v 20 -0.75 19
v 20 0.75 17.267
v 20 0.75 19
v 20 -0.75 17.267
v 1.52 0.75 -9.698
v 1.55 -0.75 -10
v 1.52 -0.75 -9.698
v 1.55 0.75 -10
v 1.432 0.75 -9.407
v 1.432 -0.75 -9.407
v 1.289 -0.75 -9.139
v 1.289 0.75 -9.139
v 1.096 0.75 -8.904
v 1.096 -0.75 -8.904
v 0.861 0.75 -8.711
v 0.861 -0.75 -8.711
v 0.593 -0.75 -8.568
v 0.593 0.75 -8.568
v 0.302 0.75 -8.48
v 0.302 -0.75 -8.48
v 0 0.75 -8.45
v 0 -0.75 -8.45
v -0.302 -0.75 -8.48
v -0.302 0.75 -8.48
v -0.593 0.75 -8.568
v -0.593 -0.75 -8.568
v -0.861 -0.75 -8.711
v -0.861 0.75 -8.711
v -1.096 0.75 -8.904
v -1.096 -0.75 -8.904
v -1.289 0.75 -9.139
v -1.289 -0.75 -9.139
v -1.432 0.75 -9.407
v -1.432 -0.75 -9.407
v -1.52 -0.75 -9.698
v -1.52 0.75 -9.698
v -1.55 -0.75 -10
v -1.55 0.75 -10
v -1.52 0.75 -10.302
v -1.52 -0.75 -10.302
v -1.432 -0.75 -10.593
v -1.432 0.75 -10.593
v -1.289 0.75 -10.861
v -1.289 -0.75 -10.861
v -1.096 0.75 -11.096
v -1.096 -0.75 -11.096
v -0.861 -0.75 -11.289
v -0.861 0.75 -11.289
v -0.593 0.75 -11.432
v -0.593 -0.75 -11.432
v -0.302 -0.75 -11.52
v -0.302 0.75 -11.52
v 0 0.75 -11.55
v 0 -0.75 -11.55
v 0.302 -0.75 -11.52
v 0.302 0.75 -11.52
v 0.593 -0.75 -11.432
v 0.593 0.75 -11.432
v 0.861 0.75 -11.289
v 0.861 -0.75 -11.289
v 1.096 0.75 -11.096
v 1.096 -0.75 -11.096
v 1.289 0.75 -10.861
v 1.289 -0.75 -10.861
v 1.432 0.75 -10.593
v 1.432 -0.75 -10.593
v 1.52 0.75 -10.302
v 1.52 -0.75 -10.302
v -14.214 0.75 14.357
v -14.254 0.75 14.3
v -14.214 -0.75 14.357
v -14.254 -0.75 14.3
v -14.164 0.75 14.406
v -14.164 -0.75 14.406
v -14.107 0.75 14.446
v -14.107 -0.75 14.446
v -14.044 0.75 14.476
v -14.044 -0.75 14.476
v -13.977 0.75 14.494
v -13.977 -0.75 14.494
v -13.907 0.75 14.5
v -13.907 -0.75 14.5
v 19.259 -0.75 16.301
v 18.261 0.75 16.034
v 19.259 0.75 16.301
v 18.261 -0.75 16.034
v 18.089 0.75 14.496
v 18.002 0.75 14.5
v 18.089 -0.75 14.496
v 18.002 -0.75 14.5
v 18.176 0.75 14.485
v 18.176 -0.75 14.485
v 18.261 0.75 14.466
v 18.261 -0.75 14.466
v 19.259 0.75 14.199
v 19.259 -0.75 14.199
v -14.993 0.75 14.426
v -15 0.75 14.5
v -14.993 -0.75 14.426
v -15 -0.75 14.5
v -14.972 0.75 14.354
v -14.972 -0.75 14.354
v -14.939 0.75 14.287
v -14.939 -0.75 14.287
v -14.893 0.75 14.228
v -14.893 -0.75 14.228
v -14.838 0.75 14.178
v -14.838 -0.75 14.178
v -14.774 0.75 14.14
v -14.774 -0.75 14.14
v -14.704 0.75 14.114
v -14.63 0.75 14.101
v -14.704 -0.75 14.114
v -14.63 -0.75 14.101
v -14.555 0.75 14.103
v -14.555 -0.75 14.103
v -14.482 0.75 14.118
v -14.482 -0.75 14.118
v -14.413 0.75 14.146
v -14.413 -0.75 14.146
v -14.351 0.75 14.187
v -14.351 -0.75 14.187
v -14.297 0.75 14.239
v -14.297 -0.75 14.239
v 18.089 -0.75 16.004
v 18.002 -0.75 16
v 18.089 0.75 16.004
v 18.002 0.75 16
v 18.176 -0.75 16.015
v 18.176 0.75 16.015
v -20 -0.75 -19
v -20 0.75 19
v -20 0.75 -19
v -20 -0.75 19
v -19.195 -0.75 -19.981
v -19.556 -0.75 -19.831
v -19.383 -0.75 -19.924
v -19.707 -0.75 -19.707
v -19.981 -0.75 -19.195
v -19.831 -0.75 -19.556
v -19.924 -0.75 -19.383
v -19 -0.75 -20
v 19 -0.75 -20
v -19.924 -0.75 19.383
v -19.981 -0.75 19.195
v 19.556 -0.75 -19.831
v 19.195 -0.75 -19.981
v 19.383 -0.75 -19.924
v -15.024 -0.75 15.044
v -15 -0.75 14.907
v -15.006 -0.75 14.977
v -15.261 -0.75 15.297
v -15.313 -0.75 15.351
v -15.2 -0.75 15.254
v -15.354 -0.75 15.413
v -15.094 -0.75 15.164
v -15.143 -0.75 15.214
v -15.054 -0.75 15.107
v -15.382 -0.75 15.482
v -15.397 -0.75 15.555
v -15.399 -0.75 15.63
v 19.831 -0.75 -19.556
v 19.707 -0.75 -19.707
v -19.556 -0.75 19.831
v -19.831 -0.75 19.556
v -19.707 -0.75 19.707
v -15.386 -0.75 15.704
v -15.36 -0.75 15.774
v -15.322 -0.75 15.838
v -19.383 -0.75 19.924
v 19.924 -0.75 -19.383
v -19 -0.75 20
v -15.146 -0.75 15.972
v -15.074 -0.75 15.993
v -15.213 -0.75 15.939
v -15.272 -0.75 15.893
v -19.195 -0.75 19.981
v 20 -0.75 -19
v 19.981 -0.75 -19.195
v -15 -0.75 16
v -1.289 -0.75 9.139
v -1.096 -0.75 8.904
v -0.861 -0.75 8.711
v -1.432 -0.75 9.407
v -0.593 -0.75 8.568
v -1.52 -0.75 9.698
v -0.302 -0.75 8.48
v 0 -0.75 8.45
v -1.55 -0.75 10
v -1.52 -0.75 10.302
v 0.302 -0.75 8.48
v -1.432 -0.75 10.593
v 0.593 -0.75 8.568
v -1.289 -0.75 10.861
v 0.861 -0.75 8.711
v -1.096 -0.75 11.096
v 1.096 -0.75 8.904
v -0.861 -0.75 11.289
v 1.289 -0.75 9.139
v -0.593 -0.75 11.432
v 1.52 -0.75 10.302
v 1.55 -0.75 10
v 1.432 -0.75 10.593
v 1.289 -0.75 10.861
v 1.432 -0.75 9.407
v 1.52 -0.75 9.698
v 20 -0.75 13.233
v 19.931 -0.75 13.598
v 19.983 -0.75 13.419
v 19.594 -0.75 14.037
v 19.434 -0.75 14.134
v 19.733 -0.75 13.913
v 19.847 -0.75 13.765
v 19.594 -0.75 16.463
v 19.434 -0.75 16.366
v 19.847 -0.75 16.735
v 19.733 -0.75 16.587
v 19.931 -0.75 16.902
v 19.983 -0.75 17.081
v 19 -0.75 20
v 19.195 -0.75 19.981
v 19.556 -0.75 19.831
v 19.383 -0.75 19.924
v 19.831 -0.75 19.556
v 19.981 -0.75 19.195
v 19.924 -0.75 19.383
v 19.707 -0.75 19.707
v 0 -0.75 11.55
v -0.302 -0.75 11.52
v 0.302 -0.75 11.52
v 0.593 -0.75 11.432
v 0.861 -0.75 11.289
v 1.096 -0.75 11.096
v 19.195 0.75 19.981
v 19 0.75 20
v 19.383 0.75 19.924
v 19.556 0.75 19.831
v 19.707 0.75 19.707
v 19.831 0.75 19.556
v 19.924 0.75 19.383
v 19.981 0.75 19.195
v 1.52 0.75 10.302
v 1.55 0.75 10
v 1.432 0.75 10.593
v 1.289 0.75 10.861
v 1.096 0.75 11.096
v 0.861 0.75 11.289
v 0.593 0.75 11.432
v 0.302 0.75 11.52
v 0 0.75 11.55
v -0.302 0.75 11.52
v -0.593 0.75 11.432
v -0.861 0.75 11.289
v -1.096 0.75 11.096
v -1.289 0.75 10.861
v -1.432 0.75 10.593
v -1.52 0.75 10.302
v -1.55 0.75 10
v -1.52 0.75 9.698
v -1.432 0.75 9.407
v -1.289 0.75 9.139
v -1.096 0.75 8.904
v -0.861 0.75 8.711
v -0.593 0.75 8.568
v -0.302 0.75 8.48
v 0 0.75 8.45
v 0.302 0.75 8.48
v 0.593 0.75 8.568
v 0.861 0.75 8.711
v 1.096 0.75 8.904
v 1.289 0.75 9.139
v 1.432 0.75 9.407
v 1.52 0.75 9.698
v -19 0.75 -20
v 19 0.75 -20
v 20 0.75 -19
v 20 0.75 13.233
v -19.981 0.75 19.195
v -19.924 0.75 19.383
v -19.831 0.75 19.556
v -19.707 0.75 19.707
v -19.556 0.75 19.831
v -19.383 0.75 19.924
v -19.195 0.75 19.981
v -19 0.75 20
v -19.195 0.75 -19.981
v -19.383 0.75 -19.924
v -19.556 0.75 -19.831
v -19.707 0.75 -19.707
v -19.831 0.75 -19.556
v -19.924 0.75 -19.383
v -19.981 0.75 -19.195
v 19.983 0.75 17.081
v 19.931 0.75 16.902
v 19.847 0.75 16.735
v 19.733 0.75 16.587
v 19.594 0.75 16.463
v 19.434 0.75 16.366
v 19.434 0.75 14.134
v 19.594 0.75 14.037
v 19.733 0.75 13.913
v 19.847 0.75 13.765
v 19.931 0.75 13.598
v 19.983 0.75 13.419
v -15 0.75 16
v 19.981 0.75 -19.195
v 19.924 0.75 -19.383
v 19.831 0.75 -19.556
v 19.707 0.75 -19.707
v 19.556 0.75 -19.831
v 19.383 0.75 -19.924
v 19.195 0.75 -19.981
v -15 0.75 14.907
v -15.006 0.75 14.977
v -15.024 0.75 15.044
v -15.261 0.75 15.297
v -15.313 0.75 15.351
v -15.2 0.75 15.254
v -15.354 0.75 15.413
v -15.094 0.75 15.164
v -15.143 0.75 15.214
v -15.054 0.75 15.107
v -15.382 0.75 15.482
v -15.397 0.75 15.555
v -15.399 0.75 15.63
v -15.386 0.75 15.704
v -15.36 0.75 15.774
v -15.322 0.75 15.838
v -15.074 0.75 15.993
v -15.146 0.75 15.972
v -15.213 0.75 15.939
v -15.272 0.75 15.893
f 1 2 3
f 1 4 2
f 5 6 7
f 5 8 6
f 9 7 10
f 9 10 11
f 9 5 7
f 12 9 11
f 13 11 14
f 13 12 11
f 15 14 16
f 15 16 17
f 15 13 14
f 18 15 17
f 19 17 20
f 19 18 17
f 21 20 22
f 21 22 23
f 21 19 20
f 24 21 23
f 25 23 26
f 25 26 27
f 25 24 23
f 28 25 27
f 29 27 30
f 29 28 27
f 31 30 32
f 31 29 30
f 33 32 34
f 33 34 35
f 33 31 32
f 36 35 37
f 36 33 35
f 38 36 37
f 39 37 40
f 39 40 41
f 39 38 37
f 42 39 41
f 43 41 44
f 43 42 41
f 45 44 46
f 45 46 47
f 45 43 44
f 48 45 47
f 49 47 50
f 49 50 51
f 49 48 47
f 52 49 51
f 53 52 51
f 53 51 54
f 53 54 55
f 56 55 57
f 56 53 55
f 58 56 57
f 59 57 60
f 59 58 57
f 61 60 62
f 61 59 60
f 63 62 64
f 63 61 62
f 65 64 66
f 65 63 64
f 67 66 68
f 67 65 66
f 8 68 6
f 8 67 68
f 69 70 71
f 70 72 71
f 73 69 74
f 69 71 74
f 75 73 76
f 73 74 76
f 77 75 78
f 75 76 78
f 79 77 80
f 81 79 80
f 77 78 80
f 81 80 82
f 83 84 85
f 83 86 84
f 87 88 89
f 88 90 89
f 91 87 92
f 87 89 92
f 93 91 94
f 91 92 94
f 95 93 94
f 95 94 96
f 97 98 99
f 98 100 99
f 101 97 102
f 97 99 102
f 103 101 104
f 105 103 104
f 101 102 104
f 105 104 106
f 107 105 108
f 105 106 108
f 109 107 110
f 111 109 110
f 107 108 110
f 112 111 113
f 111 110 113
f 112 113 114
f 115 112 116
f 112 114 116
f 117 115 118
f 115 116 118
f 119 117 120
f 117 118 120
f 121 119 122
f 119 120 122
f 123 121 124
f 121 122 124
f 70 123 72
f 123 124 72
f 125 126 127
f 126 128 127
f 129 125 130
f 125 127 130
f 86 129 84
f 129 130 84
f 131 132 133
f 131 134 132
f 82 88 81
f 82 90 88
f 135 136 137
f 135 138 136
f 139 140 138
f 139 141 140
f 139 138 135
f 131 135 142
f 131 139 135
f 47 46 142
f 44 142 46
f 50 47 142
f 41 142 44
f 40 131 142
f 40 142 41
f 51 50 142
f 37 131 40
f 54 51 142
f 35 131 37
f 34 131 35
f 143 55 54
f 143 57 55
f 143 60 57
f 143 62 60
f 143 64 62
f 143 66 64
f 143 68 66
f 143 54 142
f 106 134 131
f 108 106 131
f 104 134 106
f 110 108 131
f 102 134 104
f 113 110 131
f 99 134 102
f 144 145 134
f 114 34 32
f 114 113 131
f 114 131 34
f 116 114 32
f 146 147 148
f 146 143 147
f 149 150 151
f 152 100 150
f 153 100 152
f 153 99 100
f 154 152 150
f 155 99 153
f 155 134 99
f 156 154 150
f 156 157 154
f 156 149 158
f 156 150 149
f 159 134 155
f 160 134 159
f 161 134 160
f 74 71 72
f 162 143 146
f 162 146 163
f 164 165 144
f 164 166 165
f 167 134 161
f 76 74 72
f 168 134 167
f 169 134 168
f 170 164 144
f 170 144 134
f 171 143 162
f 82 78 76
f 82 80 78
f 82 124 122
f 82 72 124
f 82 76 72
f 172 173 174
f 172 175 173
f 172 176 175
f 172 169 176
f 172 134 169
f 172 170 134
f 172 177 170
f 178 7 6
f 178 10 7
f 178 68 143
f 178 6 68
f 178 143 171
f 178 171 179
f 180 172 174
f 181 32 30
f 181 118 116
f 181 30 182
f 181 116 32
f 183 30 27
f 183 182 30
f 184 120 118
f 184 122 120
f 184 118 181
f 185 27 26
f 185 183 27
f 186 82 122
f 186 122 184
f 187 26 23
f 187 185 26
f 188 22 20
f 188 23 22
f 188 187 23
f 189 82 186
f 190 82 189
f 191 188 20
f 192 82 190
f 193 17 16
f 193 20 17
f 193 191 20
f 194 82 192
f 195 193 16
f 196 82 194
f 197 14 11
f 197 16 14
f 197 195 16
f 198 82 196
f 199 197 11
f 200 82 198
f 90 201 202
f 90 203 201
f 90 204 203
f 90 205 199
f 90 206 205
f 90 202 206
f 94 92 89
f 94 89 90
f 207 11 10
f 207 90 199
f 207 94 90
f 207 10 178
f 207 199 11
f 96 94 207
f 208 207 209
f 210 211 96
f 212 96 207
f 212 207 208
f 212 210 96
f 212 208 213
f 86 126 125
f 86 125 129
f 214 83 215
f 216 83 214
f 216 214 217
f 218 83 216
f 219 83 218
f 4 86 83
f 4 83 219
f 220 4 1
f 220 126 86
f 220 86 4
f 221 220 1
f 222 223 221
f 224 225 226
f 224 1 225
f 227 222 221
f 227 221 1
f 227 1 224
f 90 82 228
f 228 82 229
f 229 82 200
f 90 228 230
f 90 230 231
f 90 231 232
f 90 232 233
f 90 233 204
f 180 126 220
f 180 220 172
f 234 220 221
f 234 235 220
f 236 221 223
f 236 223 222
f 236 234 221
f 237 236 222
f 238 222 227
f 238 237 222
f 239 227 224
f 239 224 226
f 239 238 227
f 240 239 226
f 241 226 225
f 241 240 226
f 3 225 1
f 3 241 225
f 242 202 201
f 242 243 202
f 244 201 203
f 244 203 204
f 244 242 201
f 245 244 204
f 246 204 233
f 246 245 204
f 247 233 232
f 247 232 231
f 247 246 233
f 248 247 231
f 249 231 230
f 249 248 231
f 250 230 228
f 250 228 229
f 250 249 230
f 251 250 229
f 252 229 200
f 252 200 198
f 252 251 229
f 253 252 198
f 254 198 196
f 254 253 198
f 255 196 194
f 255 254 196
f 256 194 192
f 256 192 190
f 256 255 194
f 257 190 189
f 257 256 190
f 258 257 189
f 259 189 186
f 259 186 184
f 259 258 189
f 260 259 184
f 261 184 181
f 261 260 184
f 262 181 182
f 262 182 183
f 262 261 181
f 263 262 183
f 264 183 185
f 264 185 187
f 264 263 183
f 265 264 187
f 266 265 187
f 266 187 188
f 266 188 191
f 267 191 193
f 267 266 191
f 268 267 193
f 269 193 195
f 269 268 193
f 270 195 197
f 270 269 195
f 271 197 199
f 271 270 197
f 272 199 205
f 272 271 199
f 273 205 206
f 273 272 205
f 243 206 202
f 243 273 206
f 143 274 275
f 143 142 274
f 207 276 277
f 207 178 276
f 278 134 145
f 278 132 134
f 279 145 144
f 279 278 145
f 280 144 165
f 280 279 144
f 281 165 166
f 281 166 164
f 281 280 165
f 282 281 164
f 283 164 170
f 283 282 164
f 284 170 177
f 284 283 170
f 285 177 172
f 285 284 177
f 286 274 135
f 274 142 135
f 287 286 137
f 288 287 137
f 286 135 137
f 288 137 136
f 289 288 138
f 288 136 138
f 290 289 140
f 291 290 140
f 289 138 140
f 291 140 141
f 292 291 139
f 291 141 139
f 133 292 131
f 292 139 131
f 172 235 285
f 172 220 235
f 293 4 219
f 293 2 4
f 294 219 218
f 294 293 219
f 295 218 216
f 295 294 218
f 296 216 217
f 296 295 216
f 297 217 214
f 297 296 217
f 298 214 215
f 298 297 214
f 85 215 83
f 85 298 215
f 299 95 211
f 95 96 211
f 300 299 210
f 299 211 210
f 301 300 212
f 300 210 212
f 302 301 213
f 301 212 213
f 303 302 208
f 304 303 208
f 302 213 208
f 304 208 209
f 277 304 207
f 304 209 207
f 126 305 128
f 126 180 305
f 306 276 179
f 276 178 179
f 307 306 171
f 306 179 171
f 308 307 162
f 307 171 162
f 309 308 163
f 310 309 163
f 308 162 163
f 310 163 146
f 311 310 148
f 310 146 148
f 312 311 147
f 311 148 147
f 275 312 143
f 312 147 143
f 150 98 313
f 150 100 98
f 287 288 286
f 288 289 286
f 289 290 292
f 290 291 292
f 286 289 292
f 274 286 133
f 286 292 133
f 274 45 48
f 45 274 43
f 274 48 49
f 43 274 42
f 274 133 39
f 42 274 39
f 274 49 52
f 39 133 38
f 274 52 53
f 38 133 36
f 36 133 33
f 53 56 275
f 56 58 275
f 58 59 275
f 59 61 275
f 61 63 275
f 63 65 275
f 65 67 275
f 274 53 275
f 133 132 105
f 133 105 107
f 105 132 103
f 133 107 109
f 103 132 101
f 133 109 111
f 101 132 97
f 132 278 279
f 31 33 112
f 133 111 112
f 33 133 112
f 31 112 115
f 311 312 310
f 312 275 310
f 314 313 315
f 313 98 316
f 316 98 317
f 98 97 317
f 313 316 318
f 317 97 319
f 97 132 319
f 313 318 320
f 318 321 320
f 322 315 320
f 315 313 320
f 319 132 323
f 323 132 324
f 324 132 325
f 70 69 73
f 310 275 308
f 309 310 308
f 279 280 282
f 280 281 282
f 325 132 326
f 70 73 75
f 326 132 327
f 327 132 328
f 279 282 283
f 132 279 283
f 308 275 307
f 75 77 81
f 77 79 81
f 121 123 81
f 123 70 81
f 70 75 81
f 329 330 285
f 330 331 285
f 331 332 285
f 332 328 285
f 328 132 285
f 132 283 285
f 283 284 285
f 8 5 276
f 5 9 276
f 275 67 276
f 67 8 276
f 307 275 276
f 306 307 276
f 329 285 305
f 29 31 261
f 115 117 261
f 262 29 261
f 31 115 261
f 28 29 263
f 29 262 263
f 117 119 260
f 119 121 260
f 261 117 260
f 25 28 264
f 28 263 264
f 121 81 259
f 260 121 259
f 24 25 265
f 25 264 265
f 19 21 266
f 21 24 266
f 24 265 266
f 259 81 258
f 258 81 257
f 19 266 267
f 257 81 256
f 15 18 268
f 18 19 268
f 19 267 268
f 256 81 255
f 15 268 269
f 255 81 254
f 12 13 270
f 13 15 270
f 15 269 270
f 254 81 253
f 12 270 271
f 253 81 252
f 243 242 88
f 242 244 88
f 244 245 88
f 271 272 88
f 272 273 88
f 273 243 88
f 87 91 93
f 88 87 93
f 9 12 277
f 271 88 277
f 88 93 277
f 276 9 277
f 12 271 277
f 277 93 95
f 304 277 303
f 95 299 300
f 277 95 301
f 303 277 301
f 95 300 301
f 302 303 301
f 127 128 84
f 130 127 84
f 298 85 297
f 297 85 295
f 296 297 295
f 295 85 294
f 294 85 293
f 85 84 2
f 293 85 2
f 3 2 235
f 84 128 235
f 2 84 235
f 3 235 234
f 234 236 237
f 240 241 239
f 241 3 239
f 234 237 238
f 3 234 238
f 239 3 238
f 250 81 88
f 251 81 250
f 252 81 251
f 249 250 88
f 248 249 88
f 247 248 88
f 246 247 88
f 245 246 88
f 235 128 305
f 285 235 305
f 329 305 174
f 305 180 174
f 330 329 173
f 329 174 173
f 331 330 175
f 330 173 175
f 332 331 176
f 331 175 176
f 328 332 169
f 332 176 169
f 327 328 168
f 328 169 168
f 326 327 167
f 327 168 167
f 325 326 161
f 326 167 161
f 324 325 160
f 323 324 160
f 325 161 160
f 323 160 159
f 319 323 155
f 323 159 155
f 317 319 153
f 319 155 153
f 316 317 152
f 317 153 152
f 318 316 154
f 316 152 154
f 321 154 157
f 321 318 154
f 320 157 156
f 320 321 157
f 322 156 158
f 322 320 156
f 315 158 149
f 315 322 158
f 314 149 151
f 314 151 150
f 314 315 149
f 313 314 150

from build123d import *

# Parameters (mm, degrees)
SKETCH017_R  = 1.55
PAD014_DEPTH = 0.75
FILLET020_R  = 0.4
FILLET021_R  = 1


with BuildPart() as part:
    # Sketch017 → Pad014 (new body, symmetric)
    with BuildSketch(Plane.XZ):
        with BuildLine():
            Line((-20, 20), (-20, -17))
            Line((-20, -18.5), (-20, -17))
            Line((-20, -18.5), (-20, -20))
            Line((-20, -20), (20, -20))
            Line((20, -20), (20, 14))
            Line((18.133975, 14.5), (20, 14))
            Line((18.133975, 14.5), (-14.2, 14.5))
            ThreePointArc((-15, 14.5), (-14.6, 14.1), (-14.2, 14.5))
            Line((-15, 14.5), (-15, 15.2))
            ThreePointArc((-15, 16), (-15.4, 15.6), (-15, 15.2))
            Line((-15, 16), (18.133975, 16))
            Line((18.133975, 16), (20, 16.5))
            Line((20, 16.5), (20, 20))
            Line((20, 20), (-20, 20))
        make_face()
        with Locations((0, 10)):
            Circle(SKETCH017_R, mode=Mode.SUBTRACT)
        with Locations((0, -10)):
            Circle(SKETCH017_R, mode=Mode.SUBTRACT)
    extrude(amount=PAD014_DEPTH, both=True)

    # Fillet020
    fillet020_edges = [part.edges().sort_by_distance(p)[0] for p in [
        (-15, 0, 15.2),
        (-14.2, 0, 14.5),
    ]]
    fillet(fillet020_edges, radius=FILLET020_R)

    # Fillet021
    fillet021_edges = [part.edges().sort_by_distance(p)[0] for p in [
        (-20, 0, 20),
        (-20, 0, -20),
        (20, 0, -20),
        (20, 0, 14),
        (18.133975, 0, 14.5),
        (18.133975, 0, 16),
        (20, 0, 16.5),
        (20, 0, 20),
    ]]
    fillet(fillet021_edges, radius=FILLET021_R)


solid = part.part
